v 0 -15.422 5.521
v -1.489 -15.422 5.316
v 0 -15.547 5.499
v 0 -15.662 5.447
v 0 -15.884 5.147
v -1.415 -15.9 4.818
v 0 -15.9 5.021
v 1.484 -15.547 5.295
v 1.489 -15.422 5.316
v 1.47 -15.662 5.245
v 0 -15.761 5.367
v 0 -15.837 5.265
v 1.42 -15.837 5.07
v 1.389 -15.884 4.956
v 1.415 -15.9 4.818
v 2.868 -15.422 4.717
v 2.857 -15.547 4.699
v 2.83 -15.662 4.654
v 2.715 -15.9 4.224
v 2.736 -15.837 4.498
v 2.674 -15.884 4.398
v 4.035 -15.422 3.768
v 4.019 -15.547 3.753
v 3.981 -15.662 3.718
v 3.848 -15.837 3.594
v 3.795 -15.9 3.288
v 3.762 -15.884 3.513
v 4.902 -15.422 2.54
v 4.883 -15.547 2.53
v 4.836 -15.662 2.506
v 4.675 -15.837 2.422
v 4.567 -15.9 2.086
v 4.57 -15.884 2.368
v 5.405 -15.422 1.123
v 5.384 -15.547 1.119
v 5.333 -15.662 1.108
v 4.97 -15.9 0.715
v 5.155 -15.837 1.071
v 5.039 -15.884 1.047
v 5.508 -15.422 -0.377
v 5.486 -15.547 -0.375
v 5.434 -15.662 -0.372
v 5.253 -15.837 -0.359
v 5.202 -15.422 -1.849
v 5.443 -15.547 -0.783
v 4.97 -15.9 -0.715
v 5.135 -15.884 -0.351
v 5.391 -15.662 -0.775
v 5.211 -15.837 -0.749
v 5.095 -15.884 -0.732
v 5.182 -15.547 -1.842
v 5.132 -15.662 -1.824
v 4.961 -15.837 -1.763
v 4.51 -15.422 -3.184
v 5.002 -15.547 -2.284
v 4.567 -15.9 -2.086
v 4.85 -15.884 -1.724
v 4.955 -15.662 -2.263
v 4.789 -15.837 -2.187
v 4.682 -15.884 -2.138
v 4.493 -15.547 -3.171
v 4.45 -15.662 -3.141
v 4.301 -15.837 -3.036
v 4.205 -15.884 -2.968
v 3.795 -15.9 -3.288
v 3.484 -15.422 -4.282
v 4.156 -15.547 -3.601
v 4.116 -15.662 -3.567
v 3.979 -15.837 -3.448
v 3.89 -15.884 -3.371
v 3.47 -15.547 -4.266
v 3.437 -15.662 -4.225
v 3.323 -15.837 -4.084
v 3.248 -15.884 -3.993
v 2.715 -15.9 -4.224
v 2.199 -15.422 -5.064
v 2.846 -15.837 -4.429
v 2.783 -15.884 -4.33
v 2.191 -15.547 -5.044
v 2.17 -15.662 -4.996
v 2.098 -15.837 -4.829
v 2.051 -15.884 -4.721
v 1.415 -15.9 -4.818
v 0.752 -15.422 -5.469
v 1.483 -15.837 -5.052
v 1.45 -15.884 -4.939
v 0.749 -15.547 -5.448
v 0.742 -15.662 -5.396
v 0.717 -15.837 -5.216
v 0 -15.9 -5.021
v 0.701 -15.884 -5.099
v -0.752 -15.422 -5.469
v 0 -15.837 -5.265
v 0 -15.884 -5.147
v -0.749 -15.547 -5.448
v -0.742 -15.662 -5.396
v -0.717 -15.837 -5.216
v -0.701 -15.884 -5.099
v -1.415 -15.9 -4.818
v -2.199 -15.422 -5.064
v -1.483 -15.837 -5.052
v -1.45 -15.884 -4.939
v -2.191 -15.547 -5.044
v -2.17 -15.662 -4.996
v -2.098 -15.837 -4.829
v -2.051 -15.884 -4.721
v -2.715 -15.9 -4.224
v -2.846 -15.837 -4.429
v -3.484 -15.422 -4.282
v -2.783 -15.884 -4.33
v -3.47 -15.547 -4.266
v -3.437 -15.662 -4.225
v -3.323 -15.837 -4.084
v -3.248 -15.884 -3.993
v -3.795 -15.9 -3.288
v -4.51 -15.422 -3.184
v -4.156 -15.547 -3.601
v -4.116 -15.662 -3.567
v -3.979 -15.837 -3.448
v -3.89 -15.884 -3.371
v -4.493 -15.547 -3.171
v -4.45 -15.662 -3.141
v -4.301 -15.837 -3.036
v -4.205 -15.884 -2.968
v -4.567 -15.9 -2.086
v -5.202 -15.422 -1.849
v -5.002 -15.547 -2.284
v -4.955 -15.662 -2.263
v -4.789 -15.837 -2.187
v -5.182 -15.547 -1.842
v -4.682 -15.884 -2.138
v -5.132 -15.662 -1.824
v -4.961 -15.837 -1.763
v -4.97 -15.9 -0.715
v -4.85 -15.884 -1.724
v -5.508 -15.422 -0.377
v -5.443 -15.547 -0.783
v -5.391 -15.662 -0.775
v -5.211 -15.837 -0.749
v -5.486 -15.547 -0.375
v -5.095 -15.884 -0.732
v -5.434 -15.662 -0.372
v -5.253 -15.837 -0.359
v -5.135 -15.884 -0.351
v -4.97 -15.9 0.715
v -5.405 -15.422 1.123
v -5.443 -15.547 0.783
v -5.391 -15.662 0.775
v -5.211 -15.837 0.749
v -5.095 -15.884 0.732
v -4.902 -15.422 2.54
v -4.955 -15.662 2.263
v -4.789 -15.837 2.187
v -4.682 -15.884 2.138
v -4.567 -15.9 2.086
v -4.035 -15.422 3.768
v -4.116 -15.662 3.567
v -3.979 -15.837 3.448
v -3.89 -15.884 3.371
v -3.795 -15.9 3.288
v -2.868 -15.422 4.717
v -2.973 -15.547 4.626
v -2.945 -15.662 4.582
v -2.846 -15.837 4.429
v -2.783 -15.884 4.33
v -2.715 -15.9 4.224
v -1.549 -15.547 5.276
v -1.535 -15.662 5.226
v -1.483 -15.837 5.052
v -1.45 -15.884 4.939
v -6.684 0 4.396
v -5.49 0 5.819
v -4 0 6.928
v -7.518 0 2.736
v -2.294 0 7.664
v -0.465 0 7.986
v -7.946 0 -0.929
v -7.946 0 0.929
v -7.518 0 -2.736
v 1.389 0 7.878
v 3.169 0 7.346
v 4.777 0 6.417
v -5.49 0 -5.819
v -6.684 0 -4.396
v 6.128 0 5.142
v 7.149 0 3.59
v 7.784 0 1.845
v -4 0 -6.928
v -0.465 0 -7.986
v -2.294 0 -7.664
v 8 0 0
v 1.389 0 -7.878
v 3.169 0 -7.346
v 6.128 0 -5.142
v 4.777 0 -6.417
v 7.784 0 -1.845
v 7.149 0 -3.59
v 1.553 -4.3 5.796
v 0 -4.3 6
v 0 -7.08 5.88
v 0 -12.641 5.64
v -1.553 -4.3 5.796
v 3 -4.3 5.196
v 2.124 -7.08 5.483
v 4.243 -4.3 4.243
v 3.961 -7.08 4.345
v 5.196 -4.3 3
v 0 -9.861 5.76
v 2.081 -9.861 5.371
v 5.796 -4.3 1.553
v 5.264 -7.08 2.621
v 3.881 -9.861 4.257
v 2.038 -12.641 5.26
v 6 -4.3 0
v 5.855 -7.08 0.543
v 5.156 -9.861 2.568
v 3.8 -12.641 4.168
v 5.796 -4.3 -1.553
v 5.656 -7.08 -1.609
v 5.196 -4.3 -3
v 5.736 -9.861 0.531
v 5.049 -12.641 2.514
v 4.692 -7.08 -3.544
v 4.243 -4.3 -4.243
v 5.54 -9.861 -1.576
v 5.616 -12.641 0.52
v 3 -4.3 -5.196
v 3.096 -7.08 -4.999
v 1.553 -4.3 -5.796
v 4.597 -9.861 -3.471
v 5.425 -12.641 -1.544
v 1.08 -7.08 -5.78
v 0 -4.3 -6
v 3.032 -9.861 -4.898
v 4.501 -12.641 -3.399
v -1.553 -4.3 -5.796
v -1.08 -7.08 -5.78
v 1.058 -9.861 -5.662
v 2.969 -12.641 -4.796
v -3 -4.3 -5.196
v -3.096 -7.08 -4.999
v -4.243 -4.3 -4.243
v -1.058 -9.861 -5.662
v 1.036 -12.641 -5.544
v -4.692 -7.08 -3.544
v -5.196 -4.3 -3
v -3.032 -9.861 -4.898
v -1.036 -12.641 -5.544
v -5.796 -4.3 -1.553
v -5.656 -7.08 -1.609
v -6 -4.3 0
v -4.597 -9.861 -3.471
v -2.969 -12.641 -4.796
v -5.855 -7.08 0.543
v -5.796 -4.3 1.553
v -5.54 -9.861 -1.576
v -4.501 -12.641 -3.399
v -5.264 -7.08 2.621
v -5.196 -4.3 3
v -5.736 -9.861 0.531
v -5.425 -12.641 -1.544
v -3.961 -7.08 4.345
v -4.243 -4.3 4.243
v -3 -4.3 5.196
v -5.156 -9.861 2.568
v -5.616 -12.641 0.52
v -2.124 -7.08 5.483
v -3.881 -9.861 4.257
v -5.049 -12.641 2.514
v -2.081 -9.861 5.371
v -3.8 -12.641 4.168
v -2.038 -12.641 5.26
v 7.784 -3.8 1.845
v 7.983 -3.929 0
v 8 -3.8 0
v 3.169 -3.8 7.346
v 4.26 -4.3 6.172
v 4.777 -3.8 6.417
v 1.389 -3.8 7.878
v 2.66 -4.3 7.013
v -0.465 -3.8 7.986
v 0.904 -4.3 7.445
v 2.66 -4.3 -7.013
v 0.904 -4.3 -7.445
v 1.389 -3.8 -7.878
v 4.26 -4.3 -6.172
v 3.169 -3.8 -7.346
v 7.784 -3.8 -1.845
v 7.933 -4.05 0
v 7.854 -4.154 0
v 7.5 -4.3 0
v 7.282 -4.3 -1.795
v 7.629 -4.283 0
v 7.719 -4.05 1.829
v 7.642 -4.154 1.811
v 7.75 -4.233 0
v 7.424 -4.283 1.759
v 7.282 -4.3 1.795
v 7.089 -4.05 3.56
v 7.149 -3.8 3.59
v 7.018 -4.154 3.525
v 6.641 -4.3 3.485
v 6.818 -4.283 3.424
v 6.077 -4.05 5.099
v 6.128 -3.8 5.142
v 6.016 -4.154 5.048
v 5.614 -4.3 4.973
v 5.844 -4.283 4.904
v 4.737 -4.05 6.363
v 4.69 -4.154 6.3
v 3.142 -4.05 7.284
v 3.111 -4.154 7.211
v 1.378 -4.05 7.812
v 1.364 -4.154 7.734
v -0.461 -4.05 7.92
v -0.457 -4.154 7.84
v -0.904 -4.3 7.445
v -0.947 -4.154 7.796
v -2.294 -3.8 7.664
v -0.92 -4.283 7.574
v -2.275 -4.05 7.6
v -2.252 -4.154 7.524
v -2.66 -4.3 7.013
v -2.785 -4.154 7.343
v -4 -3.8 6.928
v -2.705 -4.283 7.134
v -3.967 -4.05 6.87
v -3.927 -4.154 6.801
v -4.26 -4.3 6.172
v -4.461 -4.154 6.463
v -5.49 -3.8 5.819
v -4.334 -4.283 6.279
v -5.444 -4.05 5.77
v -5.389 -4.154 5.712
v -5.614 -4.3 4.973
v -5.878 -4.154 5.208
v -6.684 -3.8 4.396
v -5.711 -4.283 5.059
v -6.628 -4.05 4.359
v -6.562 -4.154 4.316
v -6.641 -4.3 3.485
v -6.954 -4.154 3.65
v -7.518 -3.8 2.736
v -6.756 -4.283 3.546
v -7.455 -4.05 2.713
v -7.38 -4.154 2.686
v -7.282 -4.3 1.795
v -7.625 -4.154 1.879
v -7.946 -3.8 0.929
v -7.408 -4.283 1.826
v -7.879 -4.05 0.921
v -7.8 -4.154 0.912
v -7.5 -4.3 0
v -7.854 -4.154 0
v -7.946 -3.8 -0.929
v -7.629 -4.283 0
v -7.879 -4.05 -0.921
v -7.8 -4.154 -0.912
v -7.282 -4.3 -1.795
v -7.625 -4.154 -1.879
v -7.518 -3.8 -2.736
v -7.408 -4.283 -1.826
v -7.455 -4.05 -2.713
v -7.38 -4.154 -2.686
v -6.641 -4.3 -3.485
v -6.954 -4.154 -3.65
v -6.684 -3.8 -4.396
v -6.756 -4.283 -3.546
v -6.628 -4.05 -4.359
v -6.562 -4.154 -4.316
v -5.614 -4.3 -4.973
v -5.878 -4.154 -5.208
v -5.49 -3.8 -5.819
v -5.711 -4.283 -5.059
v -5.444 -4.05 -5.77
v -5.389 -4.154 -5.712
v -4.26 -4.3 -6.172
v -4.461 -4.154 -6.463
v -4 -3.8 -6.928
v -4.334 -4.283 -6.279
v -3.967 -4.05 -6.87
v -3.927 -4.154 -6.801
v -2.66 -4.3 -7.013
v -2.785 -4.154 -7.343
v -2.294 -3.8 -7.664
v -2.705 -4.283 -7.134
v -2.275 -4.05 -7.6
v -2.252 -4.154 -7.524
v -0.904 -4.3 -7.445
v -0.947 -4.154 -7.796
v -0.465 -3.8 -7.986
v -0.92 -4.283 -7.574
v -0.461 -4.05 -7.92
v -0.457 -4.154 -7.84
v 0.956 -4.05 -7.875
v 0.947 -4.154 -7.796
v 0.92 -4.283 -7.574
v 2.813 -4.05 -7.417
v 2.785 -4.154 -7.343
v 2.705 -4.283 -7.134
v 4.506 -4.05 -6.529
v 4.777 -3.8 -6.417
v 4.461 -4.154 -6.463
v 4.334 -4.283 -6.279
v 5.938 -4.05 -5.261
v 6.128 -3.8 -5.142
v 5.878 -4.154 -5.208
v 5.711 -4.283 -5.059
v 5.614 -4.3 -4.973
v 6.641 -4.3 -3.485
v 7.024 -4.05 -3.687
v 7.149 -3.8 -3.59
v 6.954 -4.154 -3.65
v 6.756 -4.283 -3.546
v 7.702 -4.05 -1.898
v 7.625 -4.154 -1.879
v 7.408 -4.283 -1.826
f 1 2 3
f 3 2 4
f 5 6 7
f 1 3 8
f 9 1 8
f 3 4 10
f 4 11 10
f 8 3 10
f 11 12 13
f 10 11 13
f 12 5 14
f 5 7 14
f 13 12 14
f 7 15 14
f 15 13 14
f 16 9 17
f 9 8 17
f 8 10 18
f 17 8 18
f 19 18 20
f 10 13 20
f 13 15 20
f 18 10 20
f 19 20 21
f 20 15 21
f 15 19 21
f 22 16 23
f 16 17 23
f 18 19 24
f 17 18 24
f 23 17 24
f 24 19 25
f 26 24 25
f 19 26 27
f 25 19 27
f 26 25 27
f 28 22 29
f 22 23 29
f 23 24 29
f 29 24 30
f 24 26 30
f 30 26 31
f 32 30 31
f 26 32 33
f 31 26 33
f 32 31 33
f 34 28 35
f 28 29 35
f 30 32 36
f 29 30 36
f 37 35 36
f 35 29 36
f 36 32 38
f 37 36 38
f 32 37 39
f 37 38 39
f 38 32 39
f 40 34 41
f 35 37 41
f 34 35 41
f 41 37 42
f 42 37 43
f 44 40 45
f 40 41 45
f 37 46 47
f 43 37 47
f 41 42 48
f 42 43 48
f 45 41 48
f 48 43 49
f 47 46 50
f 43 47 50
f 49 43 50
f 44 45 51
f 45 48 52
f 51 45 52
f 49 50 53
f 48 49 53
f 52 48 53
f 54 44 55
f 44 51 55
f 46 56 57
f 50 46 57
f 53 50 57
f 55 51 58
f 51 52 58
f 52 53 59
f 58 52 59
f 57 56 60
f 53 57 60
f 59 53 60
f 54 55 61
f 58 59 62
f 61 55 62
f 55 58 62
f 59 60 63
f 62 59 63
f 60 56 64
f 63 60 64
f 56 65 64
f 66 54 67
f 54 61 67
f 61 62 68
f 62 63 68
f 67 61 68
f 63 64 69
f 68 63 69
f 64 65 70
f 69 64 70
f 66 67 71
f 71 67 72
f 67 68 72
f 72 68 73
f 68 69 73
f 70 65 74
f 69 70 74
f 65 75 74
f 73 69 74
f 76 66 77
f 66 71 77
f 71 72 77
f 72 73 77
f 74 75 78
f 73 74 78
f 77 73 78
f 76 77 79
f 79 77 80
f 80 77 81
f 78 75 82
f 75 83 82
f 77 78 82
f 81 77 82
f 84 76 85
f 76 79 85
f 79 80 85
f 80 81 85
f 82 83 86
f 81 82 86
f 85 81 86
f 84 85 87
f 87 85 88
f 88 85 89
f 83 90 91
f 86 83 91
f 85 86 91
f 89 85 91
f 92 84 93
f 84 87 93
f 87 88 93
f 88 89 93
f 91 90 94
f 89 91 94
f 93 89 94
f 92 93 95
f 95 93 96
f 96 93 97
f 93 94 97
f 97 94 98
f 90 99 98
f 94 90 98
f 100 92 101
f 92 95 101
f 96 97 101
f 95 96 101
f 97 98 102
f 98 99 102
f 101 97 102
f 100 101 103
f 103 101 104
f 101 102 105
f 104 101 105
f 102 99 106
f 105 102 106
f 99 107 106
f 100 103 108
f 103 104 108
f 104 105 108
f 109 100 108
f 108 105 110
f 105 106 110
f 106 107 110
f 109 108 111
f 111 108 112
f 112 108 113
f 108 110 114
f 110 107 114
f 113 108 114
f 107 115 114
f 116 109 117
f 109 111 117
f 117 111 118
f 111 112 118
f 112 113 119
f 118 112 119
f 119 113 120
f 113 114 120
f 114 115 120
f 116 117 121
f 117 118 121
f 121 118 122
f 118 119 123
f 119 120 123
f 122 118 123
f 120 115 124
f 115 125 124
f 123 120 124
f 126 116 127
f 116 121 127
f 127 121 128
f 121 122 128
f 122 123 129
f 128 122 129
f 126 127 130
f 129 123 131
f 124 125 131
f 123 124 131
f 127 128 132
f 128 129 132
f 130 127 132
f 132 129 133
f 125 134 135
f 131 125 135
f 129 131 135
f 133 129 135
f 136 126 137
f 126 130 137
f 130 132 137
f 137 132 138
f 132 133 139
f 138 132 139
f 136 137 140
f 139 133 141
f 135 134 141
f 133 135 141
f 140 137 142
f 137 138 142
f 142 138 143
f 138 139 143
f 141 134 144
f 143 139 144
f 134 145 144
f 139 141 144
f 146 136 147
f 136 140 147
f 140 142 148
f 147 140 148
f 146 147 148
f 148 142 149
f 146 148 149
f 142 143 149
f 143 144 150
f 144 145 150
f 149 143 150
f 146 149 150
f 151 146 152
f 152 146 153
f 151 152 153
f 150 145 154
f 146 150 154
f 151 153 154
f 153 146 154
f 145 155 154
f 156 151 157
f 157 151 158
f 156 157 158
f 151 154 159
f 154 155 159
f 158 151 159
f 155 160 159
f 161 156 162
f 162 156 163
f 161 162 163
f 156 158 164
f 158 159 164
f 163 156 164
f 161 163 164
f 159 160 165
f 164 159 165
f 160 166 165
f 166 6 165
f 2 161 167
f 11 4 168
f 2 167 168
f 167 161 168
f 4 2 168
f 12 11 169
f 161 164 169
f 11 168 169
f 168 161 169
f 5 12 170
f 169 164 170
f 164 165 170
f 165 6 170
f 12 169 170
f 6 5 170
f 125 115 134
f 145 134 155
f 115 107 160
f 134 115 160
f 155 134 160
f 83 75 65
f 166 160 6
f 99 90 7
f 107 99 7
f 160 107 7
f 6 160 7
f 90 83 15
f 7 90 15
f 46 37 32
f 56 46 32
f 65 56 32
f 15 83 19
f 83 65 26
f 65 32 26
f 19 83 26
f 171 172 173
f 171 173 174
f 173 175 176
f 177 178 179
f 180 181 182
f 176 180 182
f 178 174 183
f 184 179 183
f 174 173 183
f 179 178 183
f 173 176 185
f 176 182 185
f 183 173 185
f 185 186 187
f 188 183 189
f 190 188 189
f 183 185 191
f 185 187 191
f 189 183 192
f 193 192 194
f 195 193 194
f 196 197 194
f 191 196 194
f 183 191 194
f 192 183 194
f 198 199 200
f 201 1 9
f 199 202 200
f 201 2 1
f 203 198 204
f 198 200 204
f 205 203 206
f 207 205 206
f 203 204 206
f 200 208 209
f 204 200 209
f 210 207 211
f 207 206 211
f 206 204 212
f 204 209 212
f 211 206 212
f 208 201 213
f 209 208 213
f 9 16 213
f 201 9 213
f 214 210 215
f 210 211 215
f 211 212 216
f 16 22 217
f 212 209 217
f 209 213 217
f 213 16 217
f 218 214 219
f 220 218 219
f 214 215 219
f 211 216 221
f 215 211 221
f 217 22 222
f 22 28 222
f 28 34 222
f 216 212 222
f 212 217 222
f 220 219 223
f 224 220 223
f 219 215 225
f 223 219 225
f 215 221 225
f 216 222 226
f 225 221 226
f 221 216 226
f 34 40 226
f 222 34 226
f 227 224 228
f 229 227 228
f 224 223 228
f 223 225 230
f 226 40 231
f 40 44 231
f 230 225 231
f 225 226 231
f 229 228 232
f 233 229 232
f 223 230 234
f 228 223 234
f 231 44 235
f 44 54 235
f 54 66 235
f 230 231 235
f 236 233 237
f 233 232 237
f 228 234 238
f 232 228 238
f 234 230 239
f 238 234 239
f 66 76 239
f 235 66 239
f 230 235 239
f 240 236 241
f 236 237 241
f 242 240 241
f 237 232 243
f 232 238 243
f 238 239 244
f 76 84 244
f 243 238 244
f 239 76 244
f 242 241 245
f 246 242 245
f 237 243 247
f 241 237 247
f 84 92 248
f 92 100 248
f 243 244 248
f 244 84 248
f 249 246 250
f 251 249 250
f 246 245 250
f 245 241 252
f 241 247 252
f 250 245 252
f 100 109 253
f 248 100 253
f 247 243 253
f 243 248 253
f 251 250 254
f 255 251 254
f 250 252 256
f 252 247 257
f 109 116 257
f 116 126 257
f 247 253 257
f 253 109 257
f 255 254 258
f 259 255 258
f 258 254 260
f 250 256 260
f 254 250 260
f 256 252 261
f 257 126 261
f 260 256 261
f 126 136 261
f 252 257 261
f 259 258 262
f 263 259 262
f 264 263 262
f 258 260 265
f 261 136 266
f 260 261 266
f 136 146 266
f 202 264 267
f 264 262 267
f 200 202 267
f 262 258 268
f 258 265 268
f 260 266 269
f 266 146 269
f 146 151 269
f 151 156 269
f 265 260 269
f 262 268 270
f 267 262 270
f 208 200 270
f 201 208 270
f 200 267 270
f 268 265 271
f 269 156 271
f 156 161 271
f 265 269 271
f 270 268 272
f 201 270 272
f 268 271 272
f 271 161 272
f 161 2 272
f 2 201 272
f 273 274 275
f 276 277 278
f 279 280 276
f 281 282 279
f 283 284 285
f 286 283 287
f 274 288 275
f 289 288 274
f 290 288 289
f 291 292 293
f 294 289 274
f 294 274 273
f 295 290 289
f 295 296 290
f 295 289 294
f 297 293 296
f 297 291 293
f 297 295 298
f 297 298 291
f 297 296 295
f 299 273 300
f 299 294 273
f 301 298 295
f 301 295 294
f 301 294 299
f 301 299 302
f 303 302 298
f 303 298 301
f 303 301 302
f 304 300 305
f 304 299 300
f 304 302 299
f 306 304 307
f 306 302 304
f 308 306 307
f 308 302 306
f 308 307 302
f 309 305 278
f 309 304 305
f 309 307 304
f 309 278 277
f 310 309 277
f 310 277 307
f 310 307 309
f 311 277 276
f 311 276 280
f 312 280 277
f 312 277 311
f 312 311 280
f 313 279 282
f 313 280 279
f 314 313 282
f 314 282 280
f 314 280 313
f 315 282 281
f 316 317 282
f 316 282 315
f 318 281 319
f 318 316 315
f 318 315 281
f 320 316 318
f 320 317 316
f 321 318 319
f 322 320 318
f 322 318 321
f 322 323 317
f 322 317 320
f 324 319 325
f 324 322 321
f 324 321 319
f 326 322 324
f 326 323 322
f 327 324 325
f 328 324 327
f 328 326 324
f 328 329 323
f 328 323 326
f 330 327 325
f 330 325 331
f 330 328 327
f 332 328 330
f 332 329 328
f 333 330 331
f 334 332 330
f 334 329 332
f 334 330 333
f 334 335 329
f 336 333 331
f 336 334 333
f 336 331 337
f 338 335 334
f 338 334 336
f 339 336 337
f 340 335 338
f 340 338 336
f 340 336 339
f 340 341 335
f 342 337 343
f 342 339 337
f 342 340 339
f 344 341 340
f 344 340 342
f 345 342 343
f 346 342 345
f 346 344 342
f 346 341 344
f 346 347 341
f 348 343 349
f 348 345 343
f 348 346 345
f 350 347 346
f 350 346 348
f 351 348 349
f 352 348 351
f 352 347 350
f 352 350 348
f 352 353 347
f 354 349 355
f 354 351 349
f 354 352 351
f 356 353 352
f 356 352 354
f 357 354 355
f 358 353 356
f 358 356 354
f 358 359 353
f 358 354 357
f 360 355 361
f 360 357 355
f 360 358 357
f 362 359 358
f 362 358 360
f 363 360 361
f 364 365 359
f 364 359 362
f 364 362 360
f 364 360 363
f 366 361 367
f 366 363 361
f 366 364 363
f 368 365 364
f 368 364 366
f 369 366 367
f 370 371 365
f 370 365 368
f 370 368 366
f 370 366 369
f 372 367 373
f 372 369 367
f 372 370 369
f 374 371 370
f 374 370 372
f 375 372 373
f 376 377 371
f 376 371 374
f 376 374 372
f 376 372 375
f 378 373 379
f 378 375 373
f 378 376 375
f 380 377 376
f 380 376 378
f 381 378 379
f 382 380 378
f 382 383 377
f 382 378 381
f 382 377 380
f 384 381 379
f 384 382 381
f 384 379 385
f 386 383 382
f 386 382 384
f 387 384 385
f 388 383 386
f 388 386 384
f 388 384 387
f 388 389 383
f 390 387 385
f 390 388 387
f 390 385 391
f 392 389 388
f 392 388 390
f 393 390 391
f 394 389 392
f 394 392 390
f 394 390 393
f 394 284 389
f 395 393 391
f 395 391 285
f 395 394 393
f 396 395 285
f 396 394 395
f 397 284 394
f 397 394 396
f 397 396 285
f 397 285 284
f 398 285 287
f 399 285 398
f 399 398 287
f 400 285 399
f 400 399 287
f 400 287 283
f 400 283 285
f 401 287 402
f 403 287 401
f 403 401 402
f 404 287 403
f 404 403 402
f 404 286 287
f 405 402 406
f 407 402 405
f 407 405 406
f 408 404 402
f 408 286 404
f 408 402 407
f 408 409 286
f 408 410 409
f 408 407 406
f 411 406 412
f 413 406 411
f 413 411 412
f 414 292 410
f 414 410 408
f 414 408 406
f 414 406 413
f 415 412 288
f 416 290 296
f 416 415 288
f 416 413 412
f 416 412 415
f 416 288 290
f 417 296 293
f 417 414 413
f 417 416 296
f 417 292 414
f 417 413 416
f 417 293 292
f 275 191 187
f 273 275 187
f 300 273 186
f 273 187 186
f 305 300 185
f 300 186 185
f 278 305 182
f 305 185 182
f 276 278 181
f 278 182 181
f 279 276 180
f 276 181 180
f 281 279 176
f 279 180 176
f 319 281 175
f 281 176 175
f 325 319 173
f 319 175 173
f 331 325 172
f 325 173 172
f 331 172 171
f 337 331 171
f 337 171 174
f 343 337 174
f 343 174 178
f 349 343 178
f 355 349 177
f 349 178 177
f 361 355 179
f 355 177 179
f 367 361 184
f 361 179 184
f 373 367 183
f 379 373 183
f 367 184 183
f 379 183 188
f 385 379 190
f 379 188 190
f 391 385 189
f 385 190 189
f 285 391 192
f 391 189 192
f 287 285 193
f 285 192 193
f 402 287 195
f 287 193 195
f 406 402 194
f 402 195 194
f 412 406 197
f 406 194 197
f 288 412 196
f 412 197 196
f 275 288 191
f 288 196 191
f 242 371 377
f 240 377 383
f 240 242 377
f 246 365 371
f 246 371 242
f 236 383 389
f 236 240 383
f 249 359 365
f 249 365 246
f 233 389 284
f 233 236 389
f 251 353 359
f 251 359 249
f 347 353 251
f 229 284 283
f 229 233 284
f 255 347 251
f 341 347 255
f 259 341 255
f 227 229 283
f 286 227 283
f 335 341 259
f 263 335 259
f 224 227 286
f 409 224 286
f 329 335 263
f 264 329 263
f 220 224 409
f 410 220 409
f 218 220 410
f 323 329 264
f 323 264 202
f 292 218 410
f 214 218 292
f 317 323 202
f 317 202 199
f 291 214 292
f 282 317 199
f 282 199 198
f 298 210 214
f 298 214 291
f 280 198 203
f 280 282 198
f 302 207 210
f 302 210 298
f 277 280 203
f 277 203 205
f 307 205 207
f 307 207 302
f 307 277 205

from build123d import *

# Parameters (mm, degrees)
F0_R     = 8
F0_R_2   = 6.75
F0_R_3   = 5.515498
F1_DEPTH = 4.3
F4_R     = 0.5


with BuildPart() as f1:
    # F0 (on Front) → F1 (new body)
    with BuildSketch(Plane.XZ):
        Circle(F0_R)
        Circle(F0_R_2, mode=Mode.SUBTRACT)
        Circle(F0_R_2)
        Circle(F0_R_3, mode=Mode.SUBTRACT)
        Circle(F0_R_3)
    extrude(amount=F1_DEPTH)

    # F2 (on Right) → F3 (revolve)
    with BuildSketch(Plane.YZ):
        Polygon((-15.9, 0), (0, 0), (0, 6), (-4.3, 6), (-15.9, 5.5), align=None)
    revolve(axis=Axis((0, -7.95, 0), (0, 1, 0)))

    # F4
    f4_edges = [f1.edges().sort_by_distance(p)[0] for p in [
        (0, -15.9, -5.5),
        (-8, -4.3, 0),
    ]]
    fillet(f4_edges, radius=F4_R)


solid = f1.part
